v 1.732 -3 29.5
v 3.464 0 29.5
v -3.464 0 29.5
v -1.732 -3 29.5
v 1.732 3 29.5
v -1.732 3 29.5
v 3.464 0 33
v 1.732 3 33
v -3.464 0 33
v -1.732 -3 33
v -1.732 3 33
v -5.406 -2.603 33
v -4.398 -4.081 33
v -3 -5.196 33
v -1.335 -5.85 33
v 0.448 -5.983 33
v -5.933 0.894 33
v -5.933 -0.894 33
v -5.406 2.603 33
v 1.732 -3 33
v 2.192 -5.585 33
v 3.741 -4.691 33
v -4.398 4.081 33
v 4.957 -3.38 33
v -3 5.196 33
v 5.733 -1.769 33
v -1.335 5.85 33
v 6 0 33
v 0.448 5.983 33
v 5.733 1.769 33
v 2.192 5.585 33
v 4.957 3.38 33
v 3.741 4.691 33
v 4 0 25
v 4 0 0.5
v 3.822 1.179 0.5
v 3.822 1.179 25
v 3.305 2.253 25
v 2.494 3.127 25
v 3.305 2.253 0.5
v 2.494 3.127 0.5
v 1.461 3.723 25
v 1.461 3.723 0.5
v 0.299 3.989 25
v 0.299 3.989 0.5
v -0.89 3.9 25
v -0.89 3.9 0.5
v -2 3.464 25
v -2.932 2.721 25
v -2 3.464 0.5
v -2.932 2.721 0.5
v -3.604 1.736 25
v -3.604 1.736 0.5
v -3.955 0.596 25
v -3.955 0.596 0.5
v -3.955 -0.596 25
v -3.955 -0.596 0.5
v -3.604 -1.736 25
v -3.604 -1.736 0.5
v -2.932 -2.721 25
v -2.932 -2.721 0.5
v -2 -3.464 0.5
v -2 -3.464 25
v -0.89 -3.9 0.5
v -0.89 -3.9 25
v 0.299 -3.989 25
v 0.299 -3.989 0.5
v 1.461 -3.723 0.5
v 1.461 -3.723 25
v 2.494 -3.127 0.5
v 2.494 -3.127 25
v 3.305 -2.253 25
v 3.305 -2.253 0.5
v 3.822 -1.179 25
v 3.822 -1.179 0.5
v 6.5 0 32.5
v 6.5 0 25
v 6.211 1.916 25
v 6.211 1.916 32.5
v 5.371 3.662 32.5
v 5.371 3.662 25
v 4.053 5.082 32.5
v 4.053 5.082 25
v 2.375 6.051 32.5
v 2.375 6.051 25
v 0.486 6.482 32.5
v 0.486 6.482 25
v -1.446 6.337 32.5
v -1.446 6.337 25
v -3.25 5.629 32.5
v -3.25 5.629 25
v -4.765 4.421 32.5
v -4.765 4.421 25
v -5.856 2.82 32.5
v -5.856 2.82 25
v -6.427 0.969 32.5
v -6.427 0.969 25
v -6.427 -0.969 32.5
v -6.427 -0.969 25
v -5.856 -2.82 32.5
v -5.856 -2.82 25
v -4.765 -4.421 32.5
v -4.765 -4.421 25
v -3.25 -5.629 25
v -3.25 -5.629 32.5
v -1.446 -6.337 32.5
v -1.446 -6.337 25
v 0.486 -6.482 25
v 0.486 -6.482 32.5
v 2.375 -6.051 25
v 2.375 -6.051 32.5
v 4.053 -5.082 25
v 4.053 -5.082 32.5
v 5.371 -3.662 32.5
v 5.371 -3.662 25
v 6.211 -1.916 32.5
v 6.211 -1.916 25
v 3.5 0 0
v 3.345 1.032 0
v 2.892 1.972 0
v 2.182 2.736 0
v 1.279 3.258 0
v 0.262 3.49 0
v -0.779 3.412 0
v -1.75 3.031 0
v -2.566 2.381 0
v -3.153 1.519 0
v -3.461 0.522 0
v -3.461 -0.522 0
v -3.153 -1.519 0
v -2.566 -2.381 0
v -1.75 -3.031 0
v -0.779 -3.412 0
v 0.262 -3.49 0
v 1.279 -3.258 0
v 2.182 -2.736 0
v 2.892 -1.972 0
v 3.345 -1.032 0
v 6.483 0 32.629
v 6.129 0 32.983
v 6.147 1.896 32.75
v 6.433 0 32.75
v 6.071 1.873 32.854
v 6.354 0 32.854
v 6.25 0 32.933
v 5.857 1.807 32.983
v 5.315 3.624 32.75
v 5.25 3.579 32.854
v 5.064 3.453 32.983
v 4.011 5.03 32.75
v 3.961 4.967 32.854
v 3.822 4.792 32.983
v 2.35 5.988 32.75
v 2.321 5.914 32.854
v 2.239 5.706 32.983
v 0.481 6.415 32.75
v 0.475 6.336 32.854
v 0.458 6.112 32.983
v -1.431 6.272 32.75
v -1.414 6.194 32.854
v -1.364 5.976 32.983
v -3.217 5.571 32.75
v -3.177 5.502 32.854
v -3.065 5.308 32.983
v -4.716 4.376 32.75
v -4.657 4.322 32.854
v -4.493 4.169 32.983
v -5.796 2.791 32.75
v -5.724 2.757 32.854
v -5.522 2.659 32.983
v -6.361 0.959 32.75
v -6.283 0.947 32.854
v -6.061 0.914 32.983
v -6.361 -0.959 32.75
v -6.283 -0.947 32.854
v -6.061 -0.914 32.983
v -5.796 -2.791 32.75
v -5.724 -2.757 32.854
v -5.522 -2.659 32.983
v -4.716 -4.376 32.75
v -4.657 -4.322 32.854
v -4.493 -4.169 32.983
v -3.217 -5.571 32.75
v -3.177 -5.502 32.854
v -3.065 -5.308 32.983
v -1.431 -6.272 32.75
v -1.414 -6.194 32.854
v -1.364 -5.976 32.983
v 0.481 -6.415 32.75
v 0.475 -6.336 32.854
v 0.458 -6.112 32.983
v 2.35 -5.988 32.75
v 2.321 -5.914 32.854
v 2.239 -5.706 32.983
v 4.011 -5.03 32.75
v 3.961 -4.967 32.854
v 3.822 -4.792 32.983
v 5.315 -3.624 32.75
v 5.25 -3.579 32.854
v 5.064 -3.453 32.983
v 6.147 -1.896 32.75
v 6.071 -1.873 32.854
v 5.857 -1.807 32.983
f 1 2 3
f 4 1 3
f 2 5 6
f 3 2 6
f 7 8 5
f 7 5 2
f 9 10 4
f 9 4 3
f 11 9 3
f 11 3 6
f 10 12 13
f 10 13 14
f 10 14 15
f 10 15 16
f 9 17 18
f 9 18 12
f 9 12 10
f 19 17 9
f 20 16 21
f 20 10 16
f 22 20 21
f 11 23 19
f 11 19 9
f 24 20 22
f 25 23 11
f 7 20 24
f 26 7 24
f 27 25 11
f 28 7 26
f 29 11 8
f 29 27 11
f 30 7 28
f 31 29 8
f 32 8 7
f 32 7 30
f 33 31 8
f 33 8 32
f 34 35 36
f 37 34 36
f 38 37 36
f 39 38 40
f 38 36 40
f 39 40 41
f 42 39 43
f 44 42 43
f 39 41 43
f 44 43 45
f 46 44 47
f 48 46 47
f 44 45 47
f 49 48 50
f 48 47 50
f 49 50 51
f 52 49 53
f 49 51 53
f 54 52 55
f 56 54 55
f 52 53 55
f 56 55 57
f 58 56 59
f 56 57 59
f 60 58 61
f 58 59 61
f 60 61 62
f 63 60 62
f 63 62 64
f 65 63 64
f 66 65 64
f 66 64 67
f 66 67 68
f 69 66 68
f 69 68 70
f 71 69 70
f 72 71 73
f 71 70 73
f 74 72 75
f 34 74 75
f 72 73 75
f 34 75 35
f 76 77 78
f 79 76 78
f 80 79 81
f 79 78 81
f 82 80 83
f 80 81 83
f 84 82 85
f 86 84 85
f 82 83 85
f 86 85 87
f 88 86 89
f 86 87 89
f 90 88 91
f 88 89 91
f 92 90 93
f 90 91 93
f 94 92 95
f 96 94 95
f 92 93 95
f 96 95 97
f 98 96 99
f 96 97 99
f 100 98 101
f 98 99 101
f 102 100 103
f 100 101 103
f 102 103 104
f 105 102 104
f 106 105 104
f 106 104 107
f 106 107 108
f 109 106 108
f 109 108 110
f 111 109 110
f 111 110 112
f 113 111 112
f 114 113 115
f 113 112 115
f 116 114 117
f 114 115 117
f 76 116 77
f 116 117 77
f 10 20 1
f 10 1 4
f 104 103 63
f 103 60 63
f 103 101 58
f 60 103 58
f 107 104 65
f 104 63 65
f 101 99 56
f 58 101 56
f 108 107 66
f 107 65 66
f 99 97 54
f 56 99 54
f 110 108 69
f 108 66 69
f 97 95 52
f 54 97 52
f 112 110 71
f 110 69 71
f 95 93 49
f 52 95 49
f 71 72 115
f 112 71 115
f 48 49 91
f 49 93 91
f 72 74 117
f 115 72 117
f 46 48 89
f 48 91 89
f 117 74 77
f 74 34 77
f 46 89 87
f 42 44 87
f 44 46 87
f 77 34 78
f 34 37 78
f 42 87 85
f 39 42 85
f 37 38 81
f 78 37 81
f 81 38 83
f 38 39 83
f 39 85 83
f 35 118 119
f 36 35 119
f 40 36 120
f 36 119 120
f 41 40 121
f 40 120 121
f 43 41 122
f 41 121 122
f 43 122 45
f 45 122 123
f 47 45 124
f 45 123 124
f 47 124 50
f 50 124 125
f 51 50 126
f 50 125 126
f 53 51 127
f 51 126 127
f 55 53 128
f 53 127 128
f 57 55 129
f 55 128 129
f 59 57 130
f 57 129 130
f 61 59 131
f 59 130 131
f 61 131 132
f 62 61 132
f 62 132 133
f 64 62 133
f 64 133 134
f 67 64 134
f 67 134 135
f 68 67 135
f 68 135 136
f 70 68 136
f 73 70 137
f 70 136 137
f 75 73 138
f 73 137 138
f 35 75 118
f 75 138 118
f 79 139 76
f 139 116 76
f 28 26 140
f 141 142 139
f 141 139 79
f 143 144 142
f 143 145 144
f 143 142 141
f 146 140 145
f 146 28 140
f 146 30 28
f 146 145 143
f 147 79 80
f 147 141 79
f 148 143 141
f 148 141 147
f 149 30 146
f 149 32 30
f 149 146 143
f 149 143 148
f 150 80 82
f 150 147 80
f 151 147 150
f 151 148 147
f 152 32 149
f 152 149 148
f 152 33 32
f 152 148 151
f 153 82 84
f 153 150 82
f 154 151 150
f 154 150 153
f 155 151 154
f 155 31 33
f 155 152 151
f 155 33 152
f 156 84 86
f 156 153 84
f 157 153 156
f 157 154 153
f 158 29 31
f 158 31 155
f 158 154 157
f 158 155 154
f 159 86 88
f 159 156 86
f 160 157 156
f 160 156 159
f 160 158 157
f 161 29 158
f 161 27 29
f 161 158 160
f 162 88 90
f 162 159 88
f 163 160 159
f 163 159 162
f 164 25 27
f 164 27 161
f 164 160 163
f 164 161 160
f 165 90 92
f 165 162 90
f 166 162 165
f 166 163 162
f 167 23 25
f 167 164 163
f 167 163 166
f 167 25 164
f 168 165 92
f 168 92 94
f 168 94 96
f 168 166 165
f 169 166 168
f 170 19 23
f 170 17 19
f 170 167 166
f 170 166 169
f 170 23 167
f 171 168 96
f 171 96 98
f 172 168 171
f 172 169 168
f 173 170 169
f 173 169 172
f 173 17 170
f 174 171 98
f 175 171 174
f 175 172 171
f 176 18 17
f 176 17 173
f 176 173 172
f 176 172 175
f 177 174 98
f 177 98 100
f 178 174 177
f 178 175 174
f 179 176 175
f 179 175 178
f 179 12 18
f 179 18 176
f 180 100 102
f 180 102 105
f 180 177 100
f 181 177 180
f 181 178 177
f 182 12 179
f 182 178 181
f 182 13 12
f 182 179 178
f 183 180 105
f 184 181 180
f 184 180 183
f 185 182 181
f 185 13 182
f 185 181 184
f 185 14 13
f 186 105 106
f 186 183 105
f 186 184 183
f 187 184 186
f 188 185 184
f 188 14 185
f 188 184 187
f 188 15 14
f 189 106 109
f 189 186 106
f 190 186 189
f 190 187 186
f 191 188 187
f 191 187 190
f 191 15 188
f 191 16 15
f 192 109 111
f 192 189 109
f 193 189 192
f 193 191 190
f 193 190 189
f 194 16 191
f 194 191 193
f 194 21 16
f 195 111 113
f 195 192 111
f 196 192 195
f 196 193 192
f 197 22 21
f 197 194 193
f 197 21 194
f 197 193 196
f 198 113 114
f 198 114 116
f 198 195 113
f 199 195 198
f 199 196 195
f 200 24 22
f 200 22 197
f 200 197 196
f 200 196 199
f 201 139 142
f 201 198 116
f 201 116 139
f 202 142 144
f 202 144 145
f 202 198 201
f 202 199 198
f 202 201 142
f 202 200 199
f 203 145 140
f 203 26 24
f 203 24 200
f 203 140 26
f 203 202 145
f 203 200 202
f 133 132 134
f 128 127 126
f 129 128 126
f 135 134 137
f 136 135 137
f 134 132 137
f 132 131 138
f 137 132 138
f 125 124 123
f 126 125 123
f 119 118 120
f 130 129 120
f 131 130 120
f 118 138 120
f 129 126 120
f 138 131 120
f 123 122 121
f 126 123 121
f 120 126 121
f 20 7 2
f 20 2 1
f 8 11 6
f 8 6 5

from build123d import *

# Parameters (mm, degrees)
ESQUISSE1_R             = 4
BASE_EXTRUSION_DEPTH    = 25
ESQUISSE2_R             = 6.5
BOSS_EXTRU_1_DEPTH      = 8
ENL_V_MAT_EXTRU_1_DEPTH = 3.5
CONG_2_R                = 0.5
CHANFREIN1_SIZE         = 0.5


with BuildPart() as part:
    # Esquisse1 → Base-Extrusion (new body)
    with BuildSketch(Plane.XY):
        Circle(ESQUISSE1_R)
    extrude(amount=BASE_EXTRUSION_DEPTH)

    # Esquisse2 → Boss.-Extru.1 (add)
    with BuildSketch(Plane.XY.offset(25)):
        Circle(ESQUISSE2_R)
    extrude(amount=BOSS_EXTRU_1_DEPTH)

    # Esquisse3 → Enlèv. mat.-Extru.1 (cut)
    with BuildSketch(Plane.XY.offset(33)):
        Polygon((-1.732050808, 3), (1.732050808, 3), (3.464101615, 0), (1.732050808, -3), (-1.732050808, -3), (-3.464101615, 0), align=None)
    extrude(amount=-ENL_V_MAT_EXTRU_1_DEPTH, mode=Mode.SUBTRACT)

    # Congé2
    cong_2_edges = [part.edges().sort_by_distance(p)[0] for p in [
        (-6.5, 0, 33),
    ]]
    fillet(cong_2_edges, radius=CONG_2_R)

    # Chanfrein1
    chanfrein1_edges = [part.edges().sort_by_distance(p)[0] for p in [
        (-4, 0, 0),
    ]]
    chamfer(chanfrein1_edges, length=CHANFREIN1_SIZE)


solid = part.part
